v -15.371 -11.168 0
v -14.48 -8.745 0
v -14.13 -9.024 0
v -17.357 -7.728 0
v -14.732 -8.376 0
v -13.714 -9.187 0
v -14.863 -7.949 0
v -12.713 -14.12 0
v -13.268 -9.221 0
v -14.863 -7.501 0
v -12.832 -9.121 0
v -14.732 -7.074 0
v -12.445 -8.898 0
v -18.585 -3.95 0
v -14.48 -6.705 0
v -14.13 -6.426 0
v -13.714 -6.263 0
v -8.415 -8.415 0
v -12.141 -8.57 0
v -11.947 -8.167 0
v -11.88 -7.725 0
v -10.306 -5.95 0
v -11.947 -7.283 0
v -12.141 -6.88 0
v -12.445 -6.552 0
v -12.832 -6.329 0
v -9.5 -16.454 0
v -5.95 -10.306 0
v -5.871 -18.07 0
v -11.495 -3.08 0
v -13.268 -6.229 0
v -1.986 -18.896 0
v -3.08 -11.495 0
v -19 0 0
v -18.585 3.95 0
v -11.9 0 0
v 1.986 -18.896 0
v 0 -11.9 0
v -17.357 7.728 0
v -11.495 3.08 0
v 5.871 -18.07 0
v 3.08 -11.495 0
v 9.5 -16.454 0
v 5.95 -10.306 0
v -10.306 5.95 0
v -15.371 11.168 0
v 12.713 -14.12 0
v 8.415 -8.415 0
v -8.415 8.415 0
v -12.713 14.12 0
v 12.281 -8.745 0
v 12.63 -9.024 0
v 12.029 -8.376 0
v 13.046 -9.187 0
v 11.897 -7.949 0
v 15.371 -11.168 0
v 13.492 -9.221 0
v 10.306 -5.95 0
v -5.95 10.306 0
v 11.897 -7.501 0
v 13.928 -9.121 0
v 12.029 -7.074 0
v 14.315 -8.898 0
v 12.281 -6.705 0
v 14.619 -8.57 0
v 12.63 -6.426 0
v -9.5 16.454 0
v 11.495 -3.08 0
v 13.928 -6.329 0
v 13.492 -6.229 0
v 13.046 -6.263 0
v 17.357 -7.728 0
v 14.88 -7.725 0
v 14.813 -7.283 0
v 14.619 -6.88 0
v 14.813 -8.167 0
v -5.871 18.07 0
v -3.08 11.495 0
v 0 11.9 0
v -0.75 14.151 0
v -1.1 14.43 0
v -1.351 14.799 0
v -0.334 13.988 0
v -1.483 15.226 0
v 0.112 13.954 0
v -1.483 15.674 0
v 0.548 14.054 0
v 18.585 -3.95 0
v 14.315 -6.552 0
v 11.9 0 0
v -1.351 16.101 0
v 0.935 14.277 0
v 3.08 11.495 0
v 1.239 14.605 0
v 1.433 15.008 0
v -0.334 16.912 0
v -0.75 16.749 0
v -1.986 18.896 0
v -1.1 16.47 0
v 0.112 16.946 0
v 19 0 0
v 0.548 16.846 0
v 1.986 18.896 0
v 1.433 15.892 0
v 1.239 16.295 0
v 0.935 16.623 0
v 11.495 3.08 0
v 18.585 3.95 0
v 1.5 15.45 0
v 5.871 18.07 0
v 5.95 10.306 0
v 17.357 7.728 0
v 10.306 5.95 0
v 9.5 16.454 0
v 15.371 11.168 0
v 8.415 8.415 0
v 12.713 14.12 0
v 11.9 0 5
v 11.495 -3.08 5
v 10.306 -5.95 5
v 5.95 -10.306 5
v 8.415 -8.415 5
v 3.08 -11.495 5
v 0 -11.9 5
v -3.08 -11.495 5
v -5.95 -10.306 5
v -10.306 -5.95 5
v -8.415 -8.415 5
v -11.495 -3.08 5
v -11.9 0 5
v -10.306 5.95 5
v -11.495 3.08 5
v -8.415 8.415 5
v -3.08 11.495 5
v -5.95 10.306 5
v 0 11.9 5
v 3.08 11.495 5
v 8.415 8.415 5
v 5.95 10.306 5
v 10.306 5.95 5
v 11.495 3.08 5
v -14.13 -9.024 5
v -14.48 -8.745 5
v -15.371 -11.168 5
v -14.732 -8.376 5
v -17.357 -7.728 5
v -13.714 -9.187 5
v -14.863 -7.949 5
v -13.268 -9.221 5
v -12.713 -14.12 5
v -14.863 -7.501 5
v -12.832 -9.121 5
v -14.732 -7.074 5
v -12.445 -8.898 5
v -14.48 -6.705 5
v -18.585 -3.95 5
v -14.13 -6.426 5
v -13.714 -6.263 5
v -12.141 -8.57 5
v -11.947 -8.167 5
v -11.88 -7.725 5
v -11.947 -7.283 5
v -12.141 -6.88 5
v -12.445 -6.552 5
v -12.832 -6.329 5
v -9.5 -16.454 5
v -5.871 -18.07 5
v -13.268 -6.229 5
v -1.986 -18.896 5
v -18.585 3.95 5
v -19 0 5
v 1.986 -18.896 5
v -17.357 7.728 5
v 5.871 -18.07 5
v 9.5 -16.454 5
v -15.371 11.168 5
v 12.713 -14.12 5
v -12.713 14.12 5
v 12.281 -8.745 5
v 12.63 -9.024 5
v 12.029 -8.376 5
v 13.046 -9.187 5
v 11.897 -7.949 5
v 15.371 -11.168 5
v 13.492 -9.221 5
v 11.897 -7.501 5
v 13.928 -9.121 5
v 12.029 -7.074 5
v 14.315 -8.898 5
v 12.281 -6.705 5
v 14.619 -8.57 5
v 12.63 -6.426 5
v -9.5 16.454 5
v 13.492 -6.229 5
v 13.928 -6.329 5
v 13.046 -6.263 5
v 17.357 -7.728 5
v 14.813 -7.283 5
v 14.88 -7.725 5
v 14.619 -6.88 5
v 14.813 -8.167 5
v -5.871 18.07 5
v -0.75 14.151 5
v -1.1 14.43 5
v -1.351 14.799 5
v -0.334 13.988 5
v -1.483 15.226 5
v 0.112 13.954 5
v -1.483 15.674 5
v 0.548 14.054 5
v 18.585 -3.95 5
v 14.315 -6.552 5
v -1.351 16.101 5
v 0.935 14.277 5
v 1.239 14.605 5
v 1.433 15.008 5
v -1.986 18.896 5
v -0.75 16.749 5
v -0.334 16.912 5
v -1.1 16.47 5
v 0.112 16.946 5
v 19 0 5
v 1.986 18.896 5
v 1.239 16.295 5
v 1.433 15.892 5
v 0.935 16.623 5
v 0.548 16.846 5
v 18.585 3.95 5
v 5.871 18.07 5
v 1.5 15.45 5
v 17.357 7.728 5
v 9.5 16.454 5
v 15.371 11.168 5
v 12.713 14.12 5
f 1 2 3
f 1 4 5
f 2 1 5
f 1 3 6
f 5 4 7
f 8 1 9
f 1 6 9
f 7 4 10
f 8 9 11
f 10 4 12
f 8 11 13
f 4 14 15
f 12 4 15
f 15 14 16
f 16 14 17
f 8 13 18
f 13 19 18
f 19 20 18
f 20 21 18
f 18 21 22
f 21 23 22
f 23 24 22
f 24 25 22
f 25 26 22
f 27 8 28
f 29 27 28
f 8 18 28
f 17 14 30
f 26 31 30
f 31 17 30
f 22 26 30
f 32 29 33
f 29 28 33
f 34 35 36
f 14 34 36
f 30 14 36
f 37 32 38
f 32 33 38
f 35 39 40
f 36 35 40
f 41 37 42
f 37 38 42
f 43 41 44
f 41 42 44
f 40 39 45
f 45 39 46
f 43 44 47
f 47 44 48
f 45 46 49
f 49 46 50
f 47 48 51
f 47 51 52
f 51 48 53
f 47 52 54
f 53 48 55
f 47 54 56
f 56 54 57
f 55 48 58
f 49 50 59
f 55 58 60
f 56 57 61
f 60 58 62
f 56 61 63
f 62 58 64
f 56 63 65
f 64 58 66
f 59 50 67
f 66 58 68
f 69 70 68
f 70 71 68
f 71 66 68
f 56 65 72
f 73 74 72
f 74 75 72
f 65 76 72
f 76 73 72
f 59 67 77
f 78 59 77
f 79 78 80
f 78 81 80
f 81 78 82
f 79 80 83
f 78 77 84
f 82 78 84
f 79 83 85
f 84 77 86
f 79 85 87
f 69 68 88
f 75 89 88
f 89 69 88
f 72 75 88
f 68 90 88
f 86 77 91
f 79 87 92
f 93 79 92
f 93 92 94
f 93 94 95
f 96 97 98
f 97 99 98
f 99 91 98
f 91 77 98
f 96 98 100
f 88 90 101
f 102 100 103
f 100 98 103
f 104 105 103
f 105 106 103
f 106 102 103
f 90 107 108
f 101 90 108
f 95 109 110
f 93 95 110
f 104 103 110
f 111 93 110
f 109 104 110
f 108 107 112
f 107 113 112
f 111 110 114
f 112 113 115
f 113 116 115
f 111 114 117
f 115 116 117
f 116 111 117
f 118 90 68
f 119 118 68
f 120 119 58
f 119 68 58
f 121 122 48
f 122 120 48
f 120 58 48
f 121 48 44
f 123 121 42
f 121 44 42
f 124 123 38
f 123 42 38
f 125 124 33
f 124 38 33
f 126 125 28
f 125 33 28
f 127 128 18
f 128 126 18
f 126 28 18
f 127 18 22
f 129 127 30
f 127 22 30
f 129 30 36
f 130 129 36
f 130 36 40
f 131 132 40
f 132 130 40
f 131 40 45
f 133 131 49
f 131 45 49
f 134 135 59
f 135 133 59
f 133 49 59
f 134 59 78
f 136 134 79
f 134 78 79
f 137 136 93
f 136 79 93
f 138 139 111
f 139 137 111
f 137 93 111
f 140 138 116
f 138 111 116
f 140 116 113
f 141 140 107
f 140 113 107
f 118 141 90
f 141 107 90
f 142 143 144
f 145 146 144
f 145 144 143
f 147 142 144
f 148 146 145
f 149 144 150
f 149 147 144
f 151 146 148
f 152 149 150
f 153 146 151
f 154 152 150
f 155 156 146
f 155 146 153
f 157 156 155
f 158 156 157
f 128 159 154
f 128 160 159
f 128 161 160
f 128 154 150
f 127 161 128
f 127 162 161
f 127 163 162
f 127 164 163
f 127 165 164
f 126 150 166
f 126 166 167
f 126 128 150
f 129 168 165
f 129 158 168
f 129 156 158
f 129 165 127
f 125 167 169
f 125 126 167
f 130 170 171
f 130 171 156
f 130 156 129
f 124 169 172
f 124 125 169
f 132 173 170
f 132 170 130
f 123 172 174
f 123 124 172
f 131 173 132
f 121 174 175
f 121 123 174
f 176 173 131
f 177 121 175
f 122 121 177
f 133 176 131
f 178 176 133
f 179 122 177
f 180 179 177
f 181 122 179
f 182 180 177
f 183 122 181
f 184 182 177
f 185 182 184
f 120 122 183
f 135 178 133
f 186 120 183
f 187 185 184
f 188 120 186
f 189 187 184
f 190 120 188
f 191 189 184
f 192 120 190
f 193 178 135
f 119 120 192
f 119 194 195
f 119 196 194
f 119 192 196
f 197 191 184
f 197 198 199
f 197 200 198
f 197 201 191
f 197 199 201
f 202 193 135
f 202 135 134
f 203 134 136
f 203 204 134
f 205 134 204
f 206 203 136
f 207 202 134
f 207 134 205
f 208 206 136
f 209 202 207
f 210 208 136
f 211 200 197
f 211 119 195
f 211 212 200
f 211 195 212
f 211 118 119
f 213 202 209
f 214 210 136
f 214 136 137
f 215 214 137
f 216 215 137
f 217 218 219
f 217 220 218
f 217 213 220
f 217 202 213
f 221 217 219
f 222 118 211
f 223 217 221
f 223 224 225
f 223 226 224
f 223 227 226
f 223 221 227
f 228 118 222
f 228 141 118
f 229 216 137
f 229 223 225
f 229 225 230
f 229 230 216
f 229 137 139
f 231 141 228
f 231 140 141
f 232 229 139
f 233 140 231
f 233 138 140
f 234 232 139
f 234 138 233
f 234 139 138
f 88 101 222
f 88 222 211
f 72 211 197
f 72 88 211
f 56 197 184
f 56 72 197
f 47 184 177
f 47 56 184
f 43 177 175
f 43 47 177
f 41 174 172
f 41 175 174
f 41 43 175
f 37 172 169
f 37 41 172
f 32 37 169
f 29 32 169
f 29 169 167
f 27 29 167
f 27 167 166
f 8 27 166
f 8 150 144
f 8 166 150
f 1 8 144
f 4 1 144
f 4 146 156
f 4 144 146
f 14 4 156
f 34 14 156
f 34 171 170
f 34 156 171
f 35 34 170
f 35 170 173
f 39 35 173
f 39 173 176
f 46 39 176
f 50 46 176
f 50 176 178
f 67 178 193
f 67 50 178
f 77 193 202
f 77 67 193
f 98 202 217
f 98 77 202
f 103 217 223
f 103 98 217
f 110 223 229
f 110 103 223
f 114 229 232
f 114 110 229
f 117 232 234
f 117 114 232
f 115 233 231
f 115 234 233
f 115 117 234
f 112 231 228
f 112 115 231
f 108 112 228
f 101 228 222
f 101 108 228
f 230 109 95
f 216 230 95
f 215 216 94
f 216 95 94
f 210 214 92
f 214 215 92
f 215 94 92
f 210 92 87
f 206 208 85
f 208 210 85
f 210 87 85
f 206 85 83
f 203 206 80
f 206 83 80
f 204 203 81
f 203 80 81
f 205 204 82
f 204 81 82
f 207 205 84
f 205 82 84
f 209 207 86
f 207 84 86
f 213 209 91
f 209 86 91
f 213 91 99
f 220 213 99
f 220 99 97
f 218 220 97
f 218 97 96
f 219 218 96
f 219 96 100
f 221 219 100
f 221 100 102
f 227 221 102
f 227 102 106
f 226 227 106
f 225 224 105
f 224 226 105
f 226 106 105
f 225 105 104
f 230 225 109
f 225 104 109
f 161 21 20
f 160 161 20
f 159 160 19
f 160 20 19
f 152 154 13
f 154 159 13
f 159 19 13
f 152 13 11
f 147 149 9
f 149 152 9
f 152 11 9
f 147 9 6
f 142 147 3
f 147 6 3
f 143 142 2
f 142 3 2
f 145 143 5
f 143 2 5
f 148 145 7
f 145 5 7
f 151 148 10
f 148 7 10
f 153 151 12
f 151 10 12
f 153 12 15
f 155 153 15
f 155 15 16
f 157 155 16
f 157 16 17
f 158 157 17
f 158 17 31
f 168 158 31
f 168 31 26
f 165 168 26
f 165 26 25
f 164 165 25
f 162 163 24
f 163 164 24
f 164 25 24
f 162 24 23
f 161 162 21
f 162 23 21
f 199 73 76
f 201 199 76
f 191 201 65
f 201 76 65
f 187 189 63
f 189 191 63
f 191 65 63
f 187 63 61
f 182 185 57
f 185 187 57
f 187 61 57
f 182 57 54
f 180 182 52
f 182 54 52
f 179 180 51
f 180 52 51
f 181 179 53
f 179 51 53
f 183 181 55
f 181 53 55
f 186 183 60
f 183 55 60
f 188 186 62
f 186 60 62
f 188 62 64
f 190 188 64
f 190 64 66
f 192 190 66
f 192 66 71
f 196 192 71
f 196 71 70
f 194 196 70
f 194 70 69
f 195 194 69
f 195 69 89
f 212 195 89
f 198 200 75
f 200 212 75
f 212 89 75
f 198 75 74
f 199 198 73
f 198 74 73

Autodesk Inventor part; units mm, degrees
ref_plane "YZ Plane" through (0, 0, 0) normal (1, 0, 0) x (0, 1, 0)
ref_plane "XZ Plane" through (0, 0, 0) normal (0, 1, 0) x (-1, 0, 0)
ref_plane "XY Plane" through (0, 0, 0) normal (0, 0, 1) x (1, 0, 0)
ref_plane "РабПлоскость1" through (0, 0, 0) normal (0, 0, 1) x (1, 0, 0)
sketch "Эскиз1" plane through (0, 0, 0) normal (0, 0, 1) x (1, 0, 0)
  circle A0 centre (0, 0) radius 11.9
  circle A1 centre (0, 0) radius 19
  circle A2 centre (-13.3801, -7.725) radius 1.5
  circle A3 centre (13.3801, -7.725) radius 1.5
  circle A4 centre (0, 15.45) radius 1.5
  dimension "d12" = 3
  dimension "d13" = 3
  dimension "d14" = 3
extrude "Выдавливание1" add sketch "Эскиз1" along normal blind 5
properties part number "Проставка шестерни"
